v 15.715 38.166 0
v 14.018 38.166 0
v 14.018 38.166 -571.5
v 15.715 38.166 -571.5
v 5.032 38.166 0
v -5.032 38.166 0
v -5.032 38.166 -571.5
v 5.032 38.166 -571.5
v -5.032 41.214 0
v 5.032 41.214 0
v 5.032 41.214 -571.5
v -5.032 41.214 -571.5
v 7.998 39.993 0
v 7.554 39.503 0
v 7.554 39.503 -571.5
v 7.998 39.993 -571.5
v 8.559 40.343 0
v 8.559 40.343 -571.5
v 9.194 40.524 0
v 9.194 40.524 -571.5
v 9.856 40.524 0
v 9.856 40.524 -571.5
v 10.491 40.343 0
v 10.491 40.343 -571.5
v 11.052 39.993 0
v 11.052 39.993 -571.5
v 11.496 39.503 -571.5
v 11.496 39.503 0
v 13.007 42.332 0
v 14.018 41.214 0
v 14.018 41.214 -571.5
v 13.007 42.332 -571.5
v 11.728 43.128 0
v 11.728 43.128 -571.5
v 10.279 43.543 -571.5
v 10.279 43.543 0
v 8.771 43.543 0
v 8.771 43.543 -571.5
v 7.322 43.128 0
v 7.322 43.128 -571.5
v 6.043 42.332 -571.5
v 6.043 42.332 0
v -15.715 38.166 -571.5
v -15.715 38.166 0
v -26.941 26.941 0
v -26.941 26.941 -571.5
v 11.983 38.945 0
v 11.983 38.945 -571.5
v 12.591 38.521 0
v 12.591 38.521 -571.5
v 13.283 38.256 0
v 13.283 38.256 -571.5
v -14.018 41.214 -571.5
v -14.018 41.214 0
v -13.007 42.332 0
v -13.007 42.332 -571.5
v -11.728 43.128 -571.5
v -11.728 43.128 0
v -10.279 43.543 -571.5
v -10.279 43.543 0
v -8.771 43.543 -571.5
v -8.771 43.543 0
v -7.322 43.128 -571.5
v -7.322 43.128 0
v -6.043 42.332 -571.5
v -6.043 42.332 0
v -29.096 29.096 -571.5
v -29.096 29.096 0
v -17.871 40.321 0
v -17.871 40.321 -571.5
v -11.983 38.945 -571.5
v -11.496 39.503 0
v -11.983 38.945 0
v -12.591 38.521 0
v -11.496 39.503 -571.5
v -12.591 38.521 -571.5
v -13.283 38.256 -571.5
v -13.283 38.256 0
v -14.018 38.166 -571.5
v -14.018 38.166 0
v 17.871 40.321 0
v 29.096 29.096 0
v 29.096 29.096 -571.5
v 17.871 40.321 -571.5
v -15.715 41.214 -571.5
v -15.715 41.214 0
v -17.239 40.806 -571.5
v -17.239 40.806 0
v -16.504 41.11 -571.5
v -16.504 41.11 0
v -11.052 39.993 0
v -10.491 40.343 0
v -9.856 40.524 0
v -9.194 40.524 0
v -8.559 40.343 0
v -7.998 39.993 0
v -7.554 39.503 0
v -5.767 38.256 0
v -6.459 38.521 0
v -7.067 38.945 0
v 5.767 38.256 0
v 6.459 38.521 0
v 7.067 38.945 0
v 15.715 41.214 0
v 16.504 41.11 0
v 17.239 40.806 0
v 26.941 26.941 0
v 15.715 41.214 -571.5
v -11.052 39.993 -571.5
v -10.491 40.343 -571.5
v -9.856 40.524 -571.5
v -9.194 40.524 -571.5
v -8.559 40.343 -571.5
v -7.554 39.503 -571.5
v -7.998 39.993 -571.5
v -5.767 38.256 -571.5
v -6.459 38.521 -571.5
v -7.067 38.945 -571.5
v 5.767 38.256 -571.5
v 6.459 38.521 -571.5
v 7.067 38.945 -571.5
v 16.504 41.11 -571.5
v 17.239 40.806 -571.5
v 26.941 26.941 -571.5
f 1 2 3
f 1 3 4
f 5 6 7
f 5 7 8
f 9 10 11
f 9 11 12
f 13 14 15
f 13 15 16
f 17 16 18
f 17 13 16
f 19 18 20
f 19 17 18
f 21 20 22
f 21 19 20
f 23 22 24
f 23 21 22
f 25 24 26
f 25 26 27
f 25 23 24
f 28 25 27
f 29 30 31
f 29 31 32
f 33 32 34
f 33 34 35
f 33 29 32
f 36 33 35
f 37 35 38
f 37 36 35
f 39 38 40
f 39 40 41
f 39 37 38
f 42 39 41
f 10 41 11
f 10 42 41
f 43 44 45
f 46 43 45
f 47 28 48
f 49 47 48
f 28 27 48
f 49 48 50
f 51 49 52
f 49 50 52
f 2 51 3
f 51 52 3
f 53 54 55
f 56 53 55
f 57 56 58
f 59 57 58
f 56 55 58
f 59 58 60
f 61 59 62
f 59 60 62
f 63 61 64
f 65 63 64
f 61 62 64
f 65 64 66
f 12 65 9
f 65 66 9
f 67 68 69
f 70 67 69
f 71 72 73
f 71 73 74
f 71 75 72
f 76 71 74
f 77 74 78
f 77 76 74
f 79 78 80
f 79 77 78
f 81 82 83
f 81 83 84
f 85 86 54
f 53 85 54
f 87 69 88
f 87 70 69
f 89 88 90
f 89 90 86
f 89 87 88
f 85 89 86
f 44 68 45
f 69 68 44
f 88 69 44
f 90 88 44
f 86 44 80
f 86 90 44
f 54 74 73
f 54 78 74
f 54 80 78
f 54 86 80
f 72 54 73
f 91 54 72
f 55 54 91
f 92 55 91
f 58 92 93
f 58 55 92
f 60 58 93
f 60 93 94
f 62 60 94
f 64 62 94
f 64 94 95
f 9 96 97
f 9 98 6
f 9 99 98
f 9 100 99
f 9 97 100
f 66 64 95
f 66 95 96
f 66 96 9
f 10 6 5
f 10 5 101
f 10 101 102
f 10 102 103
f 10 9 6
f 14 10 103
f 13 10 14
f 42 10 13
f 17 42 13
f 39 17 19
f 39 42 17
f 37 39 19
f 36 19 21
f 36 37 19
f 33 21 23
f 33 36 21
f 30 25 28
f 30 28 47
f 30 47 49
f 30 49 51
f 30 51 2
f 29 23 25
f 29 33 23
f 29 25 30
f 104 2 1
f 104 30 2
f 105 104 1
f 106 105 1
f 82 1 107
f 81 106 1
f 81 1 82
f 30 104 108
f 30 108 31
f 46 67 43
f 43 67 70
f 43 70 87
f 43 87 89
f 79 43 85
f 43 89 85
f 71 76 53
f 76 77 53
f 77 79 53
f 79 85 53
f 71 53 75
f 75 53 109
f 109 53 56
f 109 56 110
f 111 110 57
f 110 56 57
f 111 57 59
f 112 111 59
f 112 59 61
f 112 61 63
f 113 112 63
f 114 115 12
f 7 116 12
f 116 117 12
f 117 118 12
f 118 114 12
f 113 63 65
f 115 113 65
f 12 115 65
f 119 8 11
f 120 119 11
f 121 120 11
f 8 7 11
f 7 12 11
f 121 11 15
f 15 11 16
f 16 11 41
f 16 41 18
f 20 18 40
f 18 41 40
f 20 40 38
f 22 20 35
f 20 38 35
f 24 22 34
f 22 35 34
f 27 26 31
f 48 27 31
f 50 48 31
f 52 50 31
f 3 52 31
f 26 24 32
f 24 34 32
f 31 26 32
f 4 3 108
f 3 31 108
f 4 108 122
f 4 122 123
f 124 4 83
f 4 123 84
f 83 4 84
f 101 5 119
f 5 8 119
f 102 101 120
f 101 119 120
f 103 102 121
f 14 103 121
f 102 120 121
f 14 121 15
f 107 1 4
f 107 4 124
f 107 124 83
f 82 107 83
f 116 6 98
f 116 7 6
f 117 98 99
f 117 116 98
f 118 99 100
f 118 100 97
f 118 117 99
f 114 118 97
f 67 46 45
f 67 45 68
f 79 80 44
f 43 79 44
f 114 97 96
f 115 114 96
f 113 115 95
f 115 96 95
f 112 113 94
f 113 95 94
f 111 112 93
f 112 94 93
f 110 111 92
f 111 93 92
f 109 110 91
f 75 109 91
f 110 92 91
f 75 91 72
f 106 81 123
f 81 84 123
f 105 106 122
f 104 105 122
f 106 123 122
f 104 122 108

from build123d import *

# Parameters (mm, degrees)
EXTRUDE_THIN1_DEPTH = 571.5
FILLET1_R           = 3.048


with BuildPart() as part:
    # Sketch1 → Extrude-Thin1 (new body)
    with BuildSketch(Plane.XY):
        with BuildLine():
            Line((0, 38.166088515), (-7.14375, 38.166088515))
            ThreePointArc((-7.14375, 38.166088515), (-9.525, 40.547338515), (-11.90625, 38.166088515))
            Line((-11.90625, 38.166088515), (-15.715448212, 38.166088515))
            Line((-15.715448212, 38.166088515), (-26.940768363, 26.940768363))
            Line((-26.940768363, 26.940768363), (-29.096029832, 29.096029832))
            Line((-29.096029832, 29.096029832), (-16.97797115, 41.214088515))
            Line((-16.97797115, 41.214088515), (-14.017933514, 41.214088515))
            ThreePointArc((-14.017933514, 41.214088515), (-9.525, 43.595338515), (-5.032066486, 41.214088515))
            Line((-5.032066486, 41.214088515), (0, 41.214088515))
            Line((0, 41.214088515), (0, 38.166088515))
        make_face()
    extrude(amount=-EXTRUDE_THIN1_DEPTH)

    # Fillet1
    fillet1_edges = [part.edges().sort_by_distance(p)[0] for p in [
        (-16.97797115, 41.214088515, -285.75),
        (-7.14375, 38.166088515, -285.75),
        (-11.90625, 38.166088515, -285.75),
    ]]
    fillet(fillet1_edges, radius=FILLET1_R)

    # Mirror1: part across plane


with BuildPart() as part_1:
    add(part.part)
    add(part.part.mirror(Plane(origin=(0, 41.214088515, -571.5), x_dir=(0, 0, 1), z_dir=(-1, 0, 0))))


solid = part_1.part
